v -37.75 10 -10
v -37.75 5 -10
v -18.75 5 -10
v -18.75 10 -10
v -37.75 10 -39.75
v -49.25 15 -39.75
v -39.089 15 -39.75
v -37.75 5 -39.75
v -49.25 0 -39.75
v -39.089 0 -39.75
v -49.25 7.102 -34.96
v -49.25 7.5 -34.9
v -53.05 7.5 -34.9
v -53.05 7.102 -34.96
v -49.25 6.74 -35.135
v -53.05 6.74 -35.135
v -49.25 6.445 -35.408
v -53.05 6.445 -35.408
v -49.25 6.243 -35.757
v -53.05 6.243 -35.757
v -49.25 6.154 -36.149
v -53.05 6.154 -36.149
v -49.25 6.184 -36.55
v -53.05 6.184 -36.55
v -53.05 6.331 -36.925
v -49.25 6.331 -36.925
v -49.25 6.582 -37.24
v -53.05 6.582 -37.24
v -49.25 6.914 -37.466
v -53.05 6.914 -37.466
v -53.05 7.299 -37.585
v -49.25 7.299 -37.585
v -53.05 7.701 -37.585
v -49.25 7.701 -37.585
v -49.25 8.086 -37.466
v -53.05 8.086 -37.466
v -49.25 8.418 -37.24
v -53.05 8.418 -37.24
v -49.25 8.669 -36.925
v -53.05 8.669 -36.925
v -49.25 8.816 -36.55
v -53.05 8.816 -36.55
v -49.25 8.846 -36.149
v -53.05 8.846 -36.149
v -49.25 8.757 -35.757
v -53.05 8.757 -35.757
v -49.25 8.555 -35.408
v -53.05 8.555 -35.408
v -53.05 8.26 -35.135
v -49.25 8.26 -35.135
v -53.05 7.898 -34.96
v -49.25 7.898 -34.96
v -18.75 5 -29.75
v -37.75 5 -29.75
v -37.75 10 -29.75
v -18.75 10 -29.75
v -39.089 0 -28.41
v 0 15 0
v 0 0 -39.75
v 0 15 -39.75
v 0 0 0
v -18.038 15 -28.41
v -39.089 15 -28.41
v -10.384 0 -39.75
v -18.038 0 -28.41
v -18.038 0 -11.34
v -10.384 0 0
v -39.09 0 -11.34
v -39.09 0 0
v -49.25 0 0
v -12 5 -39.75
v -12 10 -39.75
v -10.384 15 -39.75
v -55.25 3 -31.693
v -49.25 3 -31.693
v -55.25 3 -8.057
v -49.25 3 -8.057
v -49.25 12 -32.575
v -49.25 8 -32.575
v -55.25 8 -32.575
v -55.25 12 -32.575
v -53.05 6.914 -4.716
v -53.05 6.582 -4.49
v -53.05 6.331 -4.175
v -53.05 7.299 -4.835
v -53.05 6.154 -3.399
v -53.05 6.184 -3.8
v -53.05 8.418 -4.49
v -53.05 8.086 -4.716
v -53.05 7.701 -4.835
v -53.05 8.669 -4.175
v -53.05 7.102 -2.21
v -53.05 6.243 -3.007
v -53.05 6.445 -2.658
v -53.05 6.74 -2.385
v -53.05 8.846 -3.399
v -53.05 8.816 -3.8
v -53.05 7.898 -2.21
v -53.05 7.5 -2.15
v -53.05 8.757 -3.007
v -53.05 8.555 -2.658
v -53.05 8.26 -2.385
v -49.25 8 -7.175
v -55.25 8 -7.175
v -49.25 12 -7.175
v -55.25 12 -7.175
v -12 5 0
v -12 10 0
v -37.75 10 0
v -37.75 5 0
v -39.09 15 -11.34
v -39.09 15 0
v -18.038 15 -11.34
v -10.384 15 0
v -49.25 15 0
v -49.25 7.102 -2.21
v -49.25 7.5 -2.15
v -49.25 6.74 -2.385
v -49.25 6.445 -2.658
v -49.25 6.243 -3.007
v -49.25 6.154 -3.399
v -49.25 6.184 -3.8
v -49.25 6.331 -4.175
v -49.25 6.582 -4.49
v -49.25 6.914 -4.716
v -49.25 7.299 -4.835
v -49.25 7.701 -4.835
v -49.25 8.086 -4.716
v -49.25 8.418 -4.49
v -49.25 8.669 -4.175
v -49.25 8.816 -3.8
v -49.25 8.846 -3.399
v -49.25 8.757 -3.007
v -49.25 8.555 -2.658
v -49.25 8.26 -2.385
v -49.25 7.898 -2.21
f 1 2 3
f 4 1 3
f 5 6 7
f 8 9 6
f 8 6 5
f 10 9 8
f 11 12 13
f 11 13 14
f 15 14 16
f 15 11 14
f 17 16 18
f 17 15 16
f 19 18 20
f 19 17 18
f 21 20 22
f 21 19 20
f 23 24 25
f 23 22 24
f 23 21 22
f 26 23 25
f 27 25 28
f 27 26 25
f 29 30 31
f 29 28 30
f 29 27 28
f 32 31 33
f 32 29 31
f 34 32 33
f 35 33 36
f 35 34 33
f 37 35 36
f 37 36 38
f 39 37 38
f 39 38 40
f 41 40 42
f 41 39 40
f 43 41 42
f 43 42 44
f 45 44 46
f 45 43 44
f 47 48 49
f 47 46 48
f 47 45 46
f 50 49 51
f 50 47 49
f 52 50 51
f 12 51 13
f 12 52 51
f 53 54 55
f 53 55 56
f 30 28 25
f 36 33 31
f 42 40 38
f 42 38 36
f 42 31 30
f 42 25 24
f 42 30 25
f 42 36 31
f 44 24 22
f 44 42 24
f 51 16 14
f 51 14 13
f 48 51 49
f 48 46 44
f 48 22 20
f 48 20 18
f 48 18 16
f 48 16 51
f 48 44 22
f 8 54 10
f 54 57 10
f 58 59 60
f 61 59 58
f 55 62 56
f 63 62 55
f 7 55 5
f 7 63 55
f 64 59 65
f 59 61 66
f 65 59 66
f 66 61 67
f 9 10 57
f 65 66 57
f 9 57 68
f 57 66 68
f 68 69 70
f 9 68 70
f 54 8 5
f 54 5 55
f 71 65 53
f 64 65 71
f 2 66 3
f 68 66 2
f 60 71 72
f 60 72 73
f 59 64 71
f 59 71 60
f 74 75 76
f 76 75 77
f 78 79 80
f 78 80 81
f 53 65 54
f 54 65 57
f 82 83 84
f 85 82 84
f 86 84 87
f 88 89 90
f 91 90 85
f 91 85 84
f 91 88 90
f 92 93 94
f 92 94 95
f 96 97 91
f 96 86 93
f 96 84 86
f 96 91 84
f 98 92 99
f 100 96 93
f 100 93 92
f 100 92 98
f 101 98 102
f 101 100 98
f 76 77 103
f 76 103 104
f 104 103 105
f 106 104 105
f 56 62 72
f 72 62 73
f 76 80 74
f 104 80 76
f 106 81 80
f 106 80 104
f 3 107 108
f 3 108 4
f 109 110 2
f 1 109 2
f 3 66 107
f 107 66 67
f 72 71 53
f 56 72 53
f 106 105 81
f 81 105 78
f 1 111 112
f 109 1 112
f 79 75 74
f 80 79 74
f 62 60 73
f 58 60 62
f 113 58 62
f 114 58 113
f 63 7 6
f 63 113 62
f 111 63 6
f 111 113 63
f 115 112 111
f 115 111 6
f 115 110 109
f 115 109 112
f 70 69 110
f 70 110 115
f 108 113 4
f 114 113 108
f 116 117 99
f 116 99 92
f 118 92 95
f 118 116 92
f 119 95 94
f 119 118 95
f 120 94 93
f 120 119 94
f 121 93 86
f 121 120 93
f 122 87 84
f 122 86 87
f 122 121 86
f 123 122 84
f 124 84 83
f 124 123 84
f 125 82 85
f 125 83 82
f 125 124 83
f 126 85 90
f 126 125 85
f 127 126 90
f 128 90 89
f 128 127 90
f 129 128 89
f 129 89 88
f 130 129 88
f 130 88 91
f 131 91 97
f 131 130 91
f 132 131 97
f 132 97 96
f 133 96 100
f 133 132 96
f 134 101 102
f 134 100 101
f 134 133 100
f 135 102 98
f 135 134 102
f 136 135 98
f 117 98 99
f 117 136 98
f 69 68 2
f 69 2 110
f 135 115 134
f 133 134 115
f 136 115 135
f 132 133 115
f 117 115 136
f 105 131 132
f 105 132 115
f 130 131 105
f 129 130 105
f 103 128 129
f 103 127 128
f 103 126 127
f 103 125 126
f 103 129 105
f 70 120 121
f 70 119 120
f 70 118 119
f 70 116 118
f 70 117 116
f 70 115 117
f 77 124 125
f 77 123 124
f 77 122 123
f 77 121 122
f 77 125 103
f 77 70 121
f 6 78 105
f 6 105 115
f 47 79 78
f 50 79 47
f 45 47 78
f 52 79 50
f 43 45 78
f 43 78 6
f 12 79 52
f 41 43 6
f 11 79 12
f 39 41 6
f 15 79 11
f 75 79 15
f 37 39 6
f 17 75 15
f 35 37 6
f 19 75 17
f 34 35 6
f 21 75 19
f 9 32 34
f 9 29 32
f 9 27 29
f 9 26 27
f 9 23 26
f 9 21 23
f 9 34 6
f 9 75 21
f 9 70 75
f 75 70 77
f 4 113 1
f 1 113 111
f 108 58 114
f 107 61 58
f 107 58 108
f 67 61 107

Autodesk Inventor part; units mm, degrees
ref_plane "YZ Plane" through (0, 0, 0) normal (1, 0, 0) x (0, 1, 0)
ref_plane "XZ Plane" through (0, 0, 0) normal (0, 1, 0) x (-1, 0, 0)
ref_plane "XY Plane" through (0, 0, 0) normal (0, 0, 1) x (1, 0, 0)
sketch "Sketch1" plane through (0, 0, 0) normal (0, 1, 0) x (-1, 0, 0)
  line L0 (0, 0) -> (49.25, 0)
  line L1 (49.25, 0) -> (49.25, -39.75)
  line L2 (49.25, -39.75) -> (0, -39.75)
  line L3 (0, -39.75) -> (0, 0)
  line L4 (49.25, 0) -> (37.75, 0)
  line L5 (37.75, 0) -> (37.75, -10)
  line L6 (37.75, -10) -> (18.75, -10)
  line L7 (0, 0) -> (12, 0)
  line L8 (12, 0) -> (18.75, -10)
  line L9 (49.25, -19.875) -> (61.5731, -19.875)
  line L10 (37.75, -39.75) -> (37.75, -29.75)
  line L11 (37.75, -29.75) -> (18.75, -29.75)
  line L12 (12, -39.75) -> (18.75, -29.75)
  dimension "d0" = 49.25
  dimension "d1" = 39.75
  dimension "d2" = 11.5
  dimension "d3" = 10
  dimension "d4" = 19
  dimension "d5" = 12
extrude "Extrusion1" add sketch "Sketch1" along normal blind 15 contours L0 L8 L6 L5 L1 L2 L10 L11 L12 L3
chamfer "Chamfer1" distance 5 angle 15 1 edges at (-28.25, 15, -10) measured on face at (-31.4167, 5, -10)
chamfer "Chamfer2" distance 5 angle 15 1 edges at (-15.375, 15, -5) measured on face at (-14.25, 8.3333, -3.3333)
chamfer "Chamfer3" distance 5 angle 15 1 edges at (-37.75, 15, -5) measured on face at (-37.75, 8.3333, -3.3333)
chamfer "Chamfer4" distance 5 angle 15 1 edges at (-37.75, 0, -5) measured on face at (-37.75, 3.3333, -3.3333)
chamfer "Chamfer5" distance 5 angle 15 1 edges at (-28.25, 0, -10) measured on face at (-25.0833, 5, -10)
chamfer "Chamfer6" distance 5 angle 15 1 edges at (-15.375, 0, -5) measured on face at (-14.25, 5, -3.3333)
chamfer "Chamfer7" distance 5 angle 15 1 edges at (-28.25, 15, -29.75) measured on face at (-25.0833, 5, -29.75)
chamfer "Chamfer8" distance 5 angle 15 1 edges at (-15.375, 15, -34.75) measured on face at (-14.25, 8.3333, -36.4167)
chamfer "Chamfer9" distance 5 angle 15 1 edges at (-15.375, 0, -34.75) measured on face at (-14.25, 6.6667, -36.4167)
chamfer "Chamfer10" distance 5 angle 15 1 edges at (-28.25, 0, -29.75) measured on face at (-31.4167, 5, -29.75)
chamfer "Chamfer11" distance 5 angle 15 1 edges at (-37.75, 15, -34.75) measured on face at (-37.75, 8.3333, -36.4167)
chamfer "Chamfer12" distance 5 angle 15 1 edges at (-37.75, 0, -34.75) measured on face at (-37.75, 5.0002, -36.4167)
sketch "Sketch2" plane through (-49.25, 0, -39.75) normal (-1, 0, 0) x (0, 0, 1)
  line L0 (39.75, 0) -> (0, 0) projected
  line L1 (19.875, 0) -> (7.175, 0)
  line L2 (7.175, 0) -> (32.575, 0)
  line L3 (32.575, 0) -> (32.575, 15)
  line L4 (28.4103, 15) -> (39.75, 15) projected
  line L5 (32.575, 7.5) -> (32.575, 3)
  line L6 (32.575, 3) -> (32.575, 12)
  line L7 (7.175, 0) -> (7.175, 15)
  line L8 (32.575, 12) -> (7.175, 12)
  line L9 (7.175, 12) -> (7.175, 3)
  line L10 (7.175, 3) -> (32.575, 3)
  line L11 (32.575, 3) -> (32.575, 12)
  point P0 (7.175, 12)
  dimension "d44" = 12.7
  dimension "d45" = 25.4
  dimension "d46" = 4.5
  dimension "d47" = 9
extrude "Extrusion2" add sketch "Sketch2" along normal blind 6 contours L10 L7 L8 L3
chamfer "Chamfer13" distance 5 angle 10 1 edges at (-52.25, 3, -32.575) measured on face at (-51.25, 9, -32.575)
chamfer "Chamfer14" distance 5 angle 10 1 edges at (-52.25, 3, -7.175) measured on face at (-51.25, 6, -7.175)
sketch "Sketch3" plane through (-49.25, 0, -39.75) normal (-1, 0, 0) x (0, 0, 1)
  line L0 (39.75, 0) -> (39.75, 15) projected
  line L1 (39.75, 7.5) -> (36.25, 7.5)
  line L2 (0, 15) -> (39.75, 15) projected
  line L3 (19.875, 15) -> (19.875, 18.5612)
  circle A0 centre (36.25, 7.5) radius 1.35
  circle A1 centre (3.5, 7.5) radius 1.35
  dimension "d56" = 3.5
  dimension "d57" = 2.7
extrude "Extrusion3" add sketch "Sketch3" along normal blind 3.8
properties part number "vga_plug"
